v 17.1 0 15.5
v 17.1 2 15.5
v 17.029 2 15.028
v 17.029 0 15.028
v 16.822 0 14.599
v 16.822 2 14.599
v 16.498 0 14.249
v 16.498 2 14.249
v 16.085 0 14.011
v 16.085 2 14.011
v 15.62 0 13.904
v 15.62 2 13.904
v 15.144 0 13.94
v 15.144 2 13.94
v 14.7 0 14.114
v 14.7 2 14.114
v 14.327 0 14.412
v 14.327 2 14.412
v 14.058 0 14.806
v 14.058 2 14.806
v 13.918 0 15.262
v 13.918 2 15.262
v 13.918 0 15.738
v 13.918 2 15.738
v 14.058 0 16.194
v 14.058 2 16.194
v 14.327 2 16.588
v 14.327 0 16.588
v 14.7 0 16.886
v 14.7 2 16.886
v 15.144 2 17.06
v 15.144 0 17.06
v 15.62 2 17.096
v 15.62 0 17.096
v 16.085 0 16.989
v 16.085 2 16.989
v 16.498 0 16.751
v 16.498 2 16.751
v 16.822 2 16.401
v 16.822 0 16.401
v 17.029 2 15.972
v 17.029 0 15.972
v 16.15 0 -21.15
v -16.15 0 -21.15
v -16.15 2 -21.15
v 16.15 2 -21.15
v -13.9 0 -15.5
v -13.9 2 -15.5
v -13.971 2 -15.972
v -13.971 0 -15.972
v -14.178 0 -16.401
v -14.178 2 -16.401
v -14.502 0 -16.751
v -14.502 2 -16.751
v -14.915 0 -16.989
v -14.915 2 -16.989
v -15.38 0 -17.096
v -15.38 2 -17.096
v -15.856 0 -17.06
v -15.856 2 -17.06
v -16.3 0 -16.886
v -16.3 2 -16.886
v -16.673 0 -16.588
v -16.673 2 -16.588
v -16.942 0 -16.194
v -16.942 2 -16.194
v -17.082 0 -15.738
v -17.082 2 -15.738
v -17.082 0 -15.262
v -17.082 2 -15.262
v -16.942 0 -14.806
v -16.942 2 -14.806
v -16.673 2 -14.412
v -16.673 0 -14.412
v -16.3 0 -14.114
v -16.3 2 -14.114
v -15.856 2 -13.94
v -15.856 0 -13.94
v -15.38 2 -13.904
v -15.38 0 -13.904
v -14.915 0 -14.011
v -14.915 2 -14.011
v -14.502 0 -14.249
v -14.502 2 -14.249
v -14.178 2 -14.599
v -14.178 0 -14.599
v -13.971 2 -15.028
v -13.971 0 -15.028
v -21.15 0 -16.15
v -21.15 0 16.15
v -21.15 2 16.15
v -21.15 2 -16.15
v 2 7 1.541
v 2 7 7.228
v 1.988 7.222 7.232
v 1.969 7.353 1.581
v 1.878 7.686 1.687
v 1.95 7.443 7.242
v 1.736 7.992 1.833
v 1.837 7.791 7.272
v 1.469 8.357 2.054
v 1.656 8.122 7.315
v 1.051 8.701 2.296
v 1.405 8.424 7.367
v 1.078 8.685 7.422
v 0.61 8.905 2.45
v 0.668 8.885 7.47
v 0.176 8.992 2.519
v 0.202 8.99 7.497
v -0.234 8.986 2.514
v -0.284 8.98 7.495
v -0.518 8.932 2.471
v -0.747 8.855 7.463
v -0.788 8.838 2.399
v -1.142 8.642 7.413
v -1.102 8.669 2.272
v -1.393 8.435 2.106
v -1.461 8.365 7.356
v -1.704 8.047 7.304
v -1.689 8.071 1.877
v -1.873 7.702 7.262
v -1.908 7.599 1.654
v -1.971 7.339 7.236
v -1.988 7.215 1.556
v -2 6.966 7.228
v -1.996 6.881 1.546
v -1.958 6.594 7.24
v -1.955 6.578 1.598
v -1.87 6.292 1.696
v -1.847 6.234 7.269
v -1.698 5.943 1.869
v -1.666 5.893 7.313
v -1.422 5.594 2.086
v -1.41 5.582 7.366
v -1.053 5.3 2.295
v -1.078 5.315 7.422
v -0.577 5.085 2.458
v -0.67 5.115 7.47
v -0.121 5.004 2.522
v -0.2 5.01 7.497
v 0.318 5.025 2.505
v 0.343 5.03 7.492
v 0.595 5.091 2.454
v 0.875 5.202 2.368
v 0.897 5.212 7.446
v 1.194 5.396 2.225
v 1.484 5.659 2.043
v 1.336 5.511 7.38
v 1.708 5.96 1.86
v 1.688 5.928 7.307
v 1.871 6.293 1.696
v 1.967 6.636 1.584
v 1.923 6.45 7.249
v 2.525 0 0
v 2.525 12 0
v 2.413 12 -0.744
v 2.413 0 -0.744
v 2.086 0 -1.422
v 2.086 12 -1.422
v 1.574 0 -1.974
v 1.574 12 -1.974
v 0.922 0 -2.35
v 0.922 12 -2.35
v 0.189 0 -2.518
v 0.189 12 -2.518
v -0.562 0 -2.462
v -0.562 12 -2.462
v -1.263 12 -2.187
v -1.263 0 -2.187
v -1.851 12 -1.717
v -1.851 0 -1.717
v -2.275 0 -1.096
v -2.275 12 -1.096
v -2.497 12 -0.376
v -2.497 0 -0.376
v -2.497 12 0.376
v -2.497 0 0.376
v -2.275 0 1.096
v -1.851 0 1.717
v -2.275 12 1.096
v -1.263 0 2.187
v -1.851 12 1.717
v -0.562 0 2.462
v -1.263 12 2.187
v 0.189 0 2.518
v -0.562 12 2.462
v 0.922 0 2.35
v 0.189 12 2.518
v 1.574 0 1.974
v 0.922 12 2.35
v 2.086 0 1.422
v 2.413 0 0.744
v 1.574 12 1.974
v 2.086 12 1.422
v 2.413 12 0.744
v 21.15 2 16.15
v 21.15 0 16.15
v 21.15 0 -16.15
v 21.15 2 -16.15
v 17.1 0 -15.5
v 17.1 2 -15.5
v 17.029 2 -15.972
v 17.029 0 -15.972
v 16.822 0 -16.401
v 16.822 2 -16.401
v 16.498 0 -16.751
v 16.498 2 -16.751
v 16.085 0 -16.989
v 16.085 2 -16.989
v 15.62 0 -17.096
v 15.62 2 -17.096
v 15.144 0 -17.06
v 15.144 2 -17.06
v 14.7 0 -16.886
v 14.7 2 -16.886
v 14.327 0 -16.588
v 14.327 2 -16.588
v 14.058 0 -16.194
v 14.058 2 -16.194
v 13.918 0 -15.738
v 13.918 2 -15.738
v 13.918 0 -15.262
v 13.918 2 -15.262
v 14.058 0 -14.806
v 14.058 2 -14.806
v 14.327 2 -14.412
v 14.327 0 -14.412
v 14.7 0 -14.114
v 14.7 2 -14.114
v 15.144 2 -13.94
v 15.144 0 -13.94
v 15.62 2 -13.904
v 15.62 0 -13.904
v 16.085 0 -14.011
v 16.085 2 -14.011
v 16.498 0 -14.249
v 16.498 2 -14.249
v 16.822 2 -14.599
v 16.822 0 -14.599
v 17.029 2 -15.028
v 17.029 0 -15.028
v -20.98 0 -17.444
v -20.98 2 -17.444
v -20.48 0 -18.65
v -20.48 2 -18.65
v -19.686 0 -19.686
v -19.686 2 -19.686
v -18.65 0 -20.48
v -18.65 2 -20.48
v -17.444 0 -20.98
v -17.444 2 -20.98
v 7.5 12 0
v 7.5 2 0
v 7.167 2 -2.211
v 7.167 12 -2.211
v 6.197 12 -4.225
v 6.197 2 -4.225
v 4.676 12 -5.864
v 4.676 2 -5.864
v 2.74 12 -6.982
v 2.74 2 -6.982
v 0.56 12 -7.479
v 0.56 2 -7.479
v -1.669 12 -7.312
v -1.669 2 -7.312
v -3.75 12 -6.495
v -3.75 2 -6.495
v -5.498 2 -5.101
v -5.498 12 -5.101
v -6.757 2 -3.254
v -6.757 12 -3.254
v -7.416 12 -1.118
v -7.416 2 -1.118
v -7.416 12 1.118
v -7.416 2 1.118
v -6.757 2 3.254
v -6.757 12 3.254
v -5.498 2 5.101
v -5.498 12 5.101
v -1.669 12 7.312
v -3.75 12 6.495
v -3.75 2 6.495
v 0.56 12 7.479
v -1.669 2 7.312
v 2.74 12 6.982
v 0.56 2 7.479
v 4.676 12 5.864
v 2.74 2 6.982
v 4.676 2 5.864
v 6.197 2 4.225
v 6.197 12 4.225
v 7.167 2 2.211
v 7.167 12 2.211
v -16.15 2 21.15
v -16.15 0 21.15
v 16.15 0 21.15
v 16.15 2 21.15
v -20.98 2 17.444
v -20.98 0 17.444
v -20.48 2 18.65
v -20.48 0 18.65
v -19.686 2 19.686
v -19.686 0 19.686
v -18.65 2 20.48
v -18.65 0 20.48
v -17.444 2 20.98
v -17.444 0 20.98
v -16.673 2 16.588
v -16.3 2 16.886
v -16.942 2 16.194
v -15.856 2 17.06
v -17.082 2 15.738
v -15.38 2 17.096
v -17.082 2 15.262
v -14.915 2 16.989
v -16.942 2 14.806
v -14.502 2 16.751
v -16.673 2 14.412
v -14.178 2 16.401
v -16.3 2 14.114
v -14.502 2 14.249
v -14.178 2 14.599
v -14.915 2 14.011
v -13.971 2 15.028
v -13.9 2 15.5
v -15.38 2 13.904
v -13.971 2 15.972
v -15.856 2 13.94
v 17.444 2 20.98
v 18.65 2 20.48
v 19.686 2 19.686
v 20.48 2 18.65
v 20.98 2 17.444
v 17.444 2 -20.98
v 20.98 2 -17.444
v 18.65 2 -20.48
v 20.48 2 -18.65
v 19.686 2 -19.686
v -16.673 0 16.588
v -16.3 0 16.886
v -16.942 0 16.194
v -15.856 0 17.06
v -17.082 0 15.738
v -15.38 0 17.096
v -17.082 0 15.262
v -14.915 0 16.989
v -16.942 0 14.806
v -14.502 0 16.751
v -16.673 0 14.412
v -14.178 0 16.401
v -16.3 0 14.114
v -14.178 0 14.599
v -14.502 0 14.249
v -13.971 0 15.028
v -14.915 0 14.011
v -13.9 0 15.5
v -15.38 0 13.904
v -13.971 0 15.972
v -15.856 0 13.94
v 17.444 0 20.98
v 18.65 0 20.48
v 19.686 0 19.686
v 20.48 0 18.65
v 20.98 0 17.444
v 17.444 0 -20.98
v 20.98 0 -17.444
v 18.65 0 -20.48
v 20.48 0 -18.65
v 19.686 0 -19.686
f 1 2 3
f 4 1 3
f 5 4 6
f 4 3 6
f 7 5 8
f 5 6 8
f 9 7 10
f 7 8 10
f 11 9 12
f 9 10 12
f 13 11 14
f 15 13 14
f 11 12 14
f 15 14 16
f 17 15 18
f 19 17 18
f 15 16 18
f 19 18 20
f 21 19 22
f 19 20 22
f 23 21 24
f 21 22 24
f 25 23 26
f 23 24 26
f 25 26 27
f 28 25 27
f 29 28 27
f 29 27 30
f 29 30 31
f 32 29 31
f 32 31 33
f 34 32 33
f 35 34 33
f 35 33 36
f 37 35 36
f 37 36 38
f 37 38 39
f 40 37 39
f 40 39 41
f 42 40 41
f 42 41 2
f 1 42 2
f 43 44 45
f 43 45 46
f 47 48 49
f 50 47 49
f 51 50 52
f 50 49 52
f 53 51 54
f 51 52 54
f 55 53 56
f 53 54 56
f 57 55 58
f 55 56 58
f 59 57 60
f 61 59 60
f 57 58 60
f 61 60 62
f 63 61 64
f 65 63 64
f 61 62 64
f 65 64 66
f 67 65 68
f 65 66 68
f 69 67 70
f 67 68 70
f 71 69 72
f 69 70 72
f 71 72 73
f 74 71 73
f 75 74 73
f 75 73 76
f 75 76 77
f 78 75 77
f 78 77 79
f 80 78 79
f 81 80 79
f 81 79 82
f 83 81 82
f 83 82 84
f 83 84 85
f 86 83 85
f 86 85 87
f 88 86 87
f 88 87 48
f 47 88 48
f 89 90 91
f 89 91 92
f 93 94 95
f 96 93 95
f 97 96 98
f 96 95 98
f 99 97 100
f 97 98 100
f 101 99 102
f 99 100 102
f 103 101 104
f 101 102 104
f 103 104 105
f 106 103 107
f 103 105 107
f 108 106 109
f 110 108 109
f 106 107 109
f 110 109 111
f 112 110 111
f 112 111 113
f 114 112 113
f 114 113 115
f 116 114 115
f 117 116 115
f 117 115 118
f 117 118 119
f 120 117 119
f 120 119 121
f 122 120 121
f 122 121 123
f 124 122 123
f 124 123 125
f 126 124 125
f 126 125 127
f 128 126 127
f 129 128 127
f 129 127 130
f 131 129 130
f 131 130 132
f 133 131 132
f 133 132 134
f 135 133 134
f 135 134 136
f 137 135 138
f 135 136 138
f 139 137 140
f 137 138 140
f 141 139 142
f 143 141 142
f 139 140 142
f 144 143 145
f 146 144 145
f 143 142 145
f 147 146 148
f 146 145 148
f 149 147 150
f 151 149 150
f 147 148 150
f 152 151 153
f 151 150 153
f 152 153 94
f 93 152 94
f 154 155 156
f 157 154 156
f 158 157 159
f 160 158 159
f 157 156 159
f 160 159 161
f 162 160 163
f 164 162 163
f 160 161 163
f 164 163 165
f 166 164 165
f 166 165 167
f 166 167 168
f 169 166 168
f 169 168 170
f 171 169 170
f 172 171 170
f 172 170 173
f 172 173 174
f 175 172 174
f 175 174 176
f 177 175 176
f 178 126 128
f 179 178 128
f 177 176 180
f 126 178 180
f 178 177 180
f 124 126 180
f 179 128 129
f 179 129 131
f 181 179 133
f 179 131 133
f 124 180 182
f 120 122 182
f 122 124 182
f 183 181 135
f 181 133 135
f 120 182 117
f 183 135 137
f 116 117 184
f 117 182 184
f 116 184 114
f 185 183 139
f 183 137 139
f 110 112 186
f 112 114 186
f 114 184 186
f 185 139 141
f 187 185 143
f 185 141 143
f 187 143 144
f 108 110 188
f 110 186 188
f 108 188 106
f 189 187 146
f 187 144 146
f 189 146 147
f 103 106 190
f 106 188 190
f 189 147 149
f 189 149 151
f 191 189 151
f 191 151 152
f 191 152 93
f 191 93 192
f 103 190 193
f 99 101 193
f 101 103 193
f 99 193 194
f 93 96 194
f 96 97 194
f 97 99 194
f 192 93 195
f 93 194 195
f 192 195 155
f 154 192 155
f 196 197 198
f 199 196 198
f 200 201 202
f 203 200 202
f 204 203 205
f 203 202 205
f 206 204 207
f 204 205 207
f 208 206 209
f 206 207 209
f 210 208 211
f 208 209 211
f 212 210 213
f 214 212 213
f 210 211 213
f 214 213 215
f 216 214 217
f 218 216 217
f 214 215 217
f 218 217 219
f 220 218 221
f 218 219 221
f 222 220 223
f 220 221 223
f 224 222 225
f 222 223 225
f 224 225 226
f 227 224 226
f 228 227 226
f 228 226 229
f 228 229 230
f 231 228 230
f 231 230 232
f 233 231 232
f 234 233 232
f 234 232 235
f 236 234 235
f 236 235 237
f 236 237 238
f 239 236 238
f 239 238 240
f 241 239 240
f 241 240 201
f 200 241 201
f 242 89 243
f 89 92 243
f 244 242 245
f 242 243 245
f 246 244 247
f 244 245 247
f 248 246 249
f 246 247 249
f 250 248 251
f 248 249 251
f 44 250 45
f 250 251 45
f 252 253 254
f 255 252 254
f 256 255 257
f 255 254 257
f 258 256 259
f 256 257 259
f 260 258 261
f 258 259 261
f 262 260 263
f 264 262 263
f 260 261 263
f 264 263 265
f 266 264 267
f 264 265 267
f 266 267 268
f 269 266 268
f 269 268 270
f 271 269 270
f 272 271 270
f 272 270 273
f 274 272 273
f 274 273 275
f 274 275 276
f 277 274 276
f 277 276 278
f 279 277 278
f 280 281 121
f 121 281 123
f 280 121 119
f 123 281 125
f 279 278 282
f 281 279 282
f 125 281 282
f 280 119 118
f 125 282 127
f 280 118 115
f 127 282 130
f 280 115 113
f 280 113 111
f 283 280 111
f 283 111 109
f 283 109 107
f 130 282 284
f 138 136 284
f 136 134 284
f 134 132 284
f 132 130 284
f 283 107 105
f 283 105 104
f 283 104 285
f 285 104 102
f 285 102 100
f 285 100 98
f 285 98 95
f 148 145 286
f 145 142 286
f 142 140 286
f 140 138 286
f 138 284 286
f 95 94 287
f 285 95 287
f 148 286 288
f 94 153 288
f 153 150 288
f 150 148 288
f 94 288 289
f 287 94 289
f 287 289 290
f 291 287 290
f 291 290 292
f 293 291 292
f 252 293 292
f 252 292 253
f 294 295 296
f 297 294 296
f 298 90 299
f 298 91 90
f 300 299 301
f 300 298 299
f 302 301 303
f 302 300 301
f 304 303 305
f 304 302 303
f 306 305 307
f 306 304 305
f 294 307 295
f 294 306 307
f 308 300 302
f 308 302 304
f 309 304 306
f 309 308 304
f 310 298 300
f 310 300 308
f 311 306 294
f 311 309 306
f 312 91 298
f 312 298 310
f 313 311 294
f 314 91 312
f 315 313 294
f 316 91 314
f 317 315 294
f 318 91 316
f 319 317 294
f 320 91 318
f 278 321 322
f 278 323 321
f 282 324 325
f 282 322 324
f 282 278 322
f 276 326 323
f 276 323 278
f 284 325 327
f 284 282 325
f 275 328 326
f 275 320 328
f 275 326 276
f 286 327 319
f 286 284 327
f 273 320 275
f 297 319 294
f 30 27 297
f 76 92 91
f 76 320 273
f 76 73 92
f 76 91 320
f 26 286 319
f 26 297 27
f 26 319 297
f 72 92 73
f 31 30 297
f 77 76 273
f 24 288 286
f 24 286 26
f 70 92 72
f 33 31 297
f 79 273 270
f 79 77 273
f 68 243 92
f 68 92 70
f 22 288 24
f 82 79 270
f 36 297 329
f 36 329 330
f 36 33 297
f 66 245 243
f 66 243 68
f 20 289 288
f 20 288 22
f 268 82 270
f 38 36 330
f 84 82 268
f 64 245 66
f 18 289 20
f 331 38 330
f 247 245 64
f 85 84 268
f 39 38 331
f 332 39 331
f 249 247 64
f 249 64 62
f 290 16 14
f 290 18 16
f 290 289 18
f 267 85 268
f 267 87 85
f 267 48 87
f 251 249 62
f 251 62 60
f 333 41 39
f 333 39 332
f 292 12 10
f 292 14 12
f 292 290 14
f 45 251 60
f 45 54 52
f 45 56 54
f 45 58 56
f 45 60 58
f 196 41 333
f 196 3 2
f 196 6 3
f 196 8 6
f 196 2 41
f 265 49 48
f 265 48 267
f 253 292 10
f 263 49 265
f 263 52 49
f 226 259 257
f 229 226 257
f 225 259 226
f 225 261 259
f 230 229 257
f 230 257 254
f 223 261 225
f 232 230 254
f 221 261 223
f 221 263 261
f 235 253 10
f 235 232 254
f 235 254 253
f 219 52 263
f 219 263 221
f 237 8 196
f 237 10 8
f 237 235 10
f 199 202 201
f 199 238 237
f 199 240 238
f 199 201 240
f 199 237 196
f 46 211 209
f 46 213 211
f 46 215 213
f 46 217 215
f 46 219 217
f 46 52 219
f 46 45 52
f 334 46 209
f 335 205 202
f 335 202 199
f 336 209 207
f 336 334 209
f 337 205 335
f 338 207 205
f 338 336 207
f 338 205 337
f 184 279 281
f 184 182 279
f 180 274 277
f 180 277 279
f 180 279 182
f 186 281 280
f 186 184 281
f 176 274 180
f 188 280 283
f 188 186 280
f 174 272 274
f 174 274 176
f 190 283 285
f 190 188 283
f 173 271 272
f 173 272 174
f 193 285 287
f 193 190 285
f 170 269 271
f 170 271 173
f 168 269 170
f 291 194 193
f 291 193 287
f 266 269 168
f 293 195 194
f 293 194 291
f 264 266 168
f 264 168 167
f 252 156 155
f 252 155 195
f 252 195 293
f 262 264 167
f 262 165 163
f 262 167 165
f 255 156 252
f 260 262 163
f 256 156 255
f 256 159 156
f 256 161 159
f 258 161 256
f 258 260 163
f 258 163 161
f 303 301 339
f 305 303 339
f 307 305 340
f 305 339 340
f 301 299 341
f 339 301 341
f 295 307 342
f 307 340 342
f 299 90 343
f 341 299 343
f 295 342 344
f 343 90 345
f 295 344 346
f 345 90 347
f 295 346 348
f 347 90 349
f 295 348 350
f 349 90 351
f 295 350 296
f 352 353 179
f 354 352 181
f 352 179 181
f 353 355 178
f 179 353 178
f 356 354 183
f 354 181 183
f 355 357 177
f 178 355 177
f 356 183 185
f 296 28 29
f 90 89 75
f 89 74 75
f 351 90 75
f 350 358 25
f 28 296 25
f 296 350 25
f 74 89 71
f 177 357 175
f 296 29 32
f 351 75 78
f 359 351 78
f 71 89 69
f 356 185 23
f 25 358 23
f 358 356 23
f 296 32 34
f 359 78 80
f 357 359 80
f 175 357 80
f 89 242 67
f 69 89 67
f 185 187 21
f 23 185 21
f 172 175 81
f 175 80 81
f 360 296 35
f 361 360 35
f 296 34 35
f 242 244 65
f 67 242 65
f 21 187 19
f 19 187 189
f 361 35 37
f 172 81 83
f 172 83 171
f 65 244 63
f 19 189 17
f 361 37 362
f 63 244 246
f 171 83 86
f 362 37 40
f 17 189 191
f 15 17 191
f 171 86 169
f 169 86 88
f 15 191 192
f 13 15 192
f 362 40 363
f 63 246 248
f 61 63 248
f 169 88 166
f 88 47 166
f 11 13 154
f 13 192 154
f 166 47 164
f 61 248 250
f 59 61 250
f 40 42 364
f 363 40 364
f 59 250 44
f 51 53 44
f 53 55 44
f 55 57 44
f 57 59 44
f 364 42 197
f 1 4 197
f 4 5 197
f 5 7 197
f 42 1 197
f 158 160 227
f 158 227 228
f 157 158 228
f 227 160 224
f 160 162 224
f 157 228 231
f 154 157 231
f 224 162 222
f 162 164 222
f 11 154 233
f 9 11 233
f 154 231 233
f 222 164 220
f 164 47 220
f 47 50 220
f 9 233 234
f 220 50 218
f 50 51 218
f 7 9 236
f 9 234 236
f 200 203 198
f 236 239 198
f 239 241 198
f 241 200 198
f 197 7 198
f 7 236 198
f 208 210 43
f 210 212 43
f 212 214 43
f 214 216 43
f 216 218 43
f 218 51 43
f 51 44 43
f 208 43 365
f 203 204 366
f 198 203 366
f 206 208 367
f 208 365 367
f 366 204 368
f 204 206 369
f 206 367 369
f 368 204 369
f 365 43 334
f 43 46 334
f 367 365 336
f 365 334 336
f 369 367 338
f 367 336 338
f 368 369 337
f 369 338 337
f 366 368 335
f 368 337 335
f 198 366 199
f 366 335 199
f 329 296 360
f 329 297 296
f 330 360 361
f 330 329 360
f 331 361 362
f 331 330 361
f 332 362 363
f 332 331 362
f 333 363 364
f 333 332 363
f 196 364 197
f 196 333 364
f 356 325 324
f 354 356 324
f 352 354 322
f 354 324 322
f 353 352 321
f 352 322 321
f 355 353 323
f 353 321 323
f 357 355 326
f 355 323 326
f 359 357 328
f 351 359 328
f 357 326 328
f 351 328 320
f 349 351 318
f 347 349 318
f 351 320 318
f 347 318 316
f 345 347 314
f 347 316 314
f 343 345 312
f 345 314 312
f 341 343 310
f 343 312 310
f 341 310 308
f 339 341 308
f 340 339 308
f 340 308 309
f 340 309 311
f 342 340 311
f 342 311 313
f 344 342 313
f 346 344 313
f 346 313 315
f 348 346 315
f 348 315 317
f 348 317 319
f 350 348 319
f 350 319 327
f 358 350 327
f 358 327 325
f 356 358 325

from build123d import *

# Parameters (mm, degrees)
SKETCH_1_W          = 42.3
SKETCH_1_H          = 42.3
EXTRUDE_1_DEPTH     = 2
SKETCH_2_R          = 1.6
CUT_EXTRUDE_1_DEPTH = 3
SKETCH_3_R          = 7.5
EXTRUDE_2_DEPTH     = 10
SKETCH_4_R          = 2.525
CUT_EXTRUDE_3_DEPTH = 13
FILLET_1_R          = 5
CUT_EXTRUDE_4_REACH = 30.65
SKETCH_5_R          = 2


with BuildPart() as part:
    # 草图1 → 凸台-拉伸1 (new body)
    with BuildSketch(Plane(origin=(0, 0, 0), x_dir=(1, 0, 0), z_dir=(0, 1, 0))):
        Rectangle(SKETCH_1_W, SKETCH_1_H)
    extrude(amount=EXTRUDE_1_DEPTH)

    # 草图2 → 切除-拉伸1 (cut, through all)
    with BuildSketch(Plane(origin=(0, 2, 0), x_dir=(1, 0, 0), z_dir=(0, 1, 0))):
        with Locations((-15.5, 15.5)):
            Circle(SKETCH_2_R)
        with Locations((15.5, 15.5)):
            Circle(SKETCH_2_R)
        with Locations((15.5, -15.5)):
            Circle(SKETCH_2_R)
        with Locations((-15.5, -15.5)):
            Circle(SKETCH_2_R)
    extrude(amount=-CUT_EXTRUDE_1_DEPTH, mode=Mode.SUBTRACT)

    # 草图3 → 凸台-拉伸2 (add)
    with BuildSketch(Plane(origin=(0, 2, 0), x_dir=(1, 0, 0), z_dir=(0, 1, 0))):
        Circle(SKETCH_3_R)
    extrude(amount=EXTRUDE_2_DEPTH)

    # 草图4 → 切除-拉伸3 (cut, through all)
    with BuildSketch(Plane(origin=(0, 12, 0), x_dir=(1, 0, 0), z_dir=(0, 1, 0))):
        Circle(SKETCH_4_R)
    extrude(amount=-CUT_EXTRUDE_3_DEPTH, mode=Mode.SUBTRACT)

    # 圆角1
    fillet_1_edges = [part.edges().sort_by_distance(p)[0] for p in [
        (21.15, 1, 21.15),
        (-21.15, 1, 21.15),
        (-21.15, 1, -21.15),
        (21.15, 1, -21.15),
    ]]
    fillet(fillet_1_edges, radius=FILLET_1_R)

    # 草图5 → 切除-拉伸4 (cut, up to next)
    with BuildSketch(Plane.XY.offset(7.5), mode=Mode.PRIVATE) as cut_extrude_4_sk1:
        with Locations((0, 7)):
            Circle(SKETCH_5_R)
    cut_extrude_4_tool1 = extrude(cut_extrude_4_sk1.sketch, amount=-CUT_EXTRUDE_4_REACH, mode=Mode.PRIVATE) & part.part
    add(cut_extrude_4_tool1.solids().sort_by_distance((0, 7, 7.5))[0], mode=Mode.SUBTRACT)


solid = part.part
